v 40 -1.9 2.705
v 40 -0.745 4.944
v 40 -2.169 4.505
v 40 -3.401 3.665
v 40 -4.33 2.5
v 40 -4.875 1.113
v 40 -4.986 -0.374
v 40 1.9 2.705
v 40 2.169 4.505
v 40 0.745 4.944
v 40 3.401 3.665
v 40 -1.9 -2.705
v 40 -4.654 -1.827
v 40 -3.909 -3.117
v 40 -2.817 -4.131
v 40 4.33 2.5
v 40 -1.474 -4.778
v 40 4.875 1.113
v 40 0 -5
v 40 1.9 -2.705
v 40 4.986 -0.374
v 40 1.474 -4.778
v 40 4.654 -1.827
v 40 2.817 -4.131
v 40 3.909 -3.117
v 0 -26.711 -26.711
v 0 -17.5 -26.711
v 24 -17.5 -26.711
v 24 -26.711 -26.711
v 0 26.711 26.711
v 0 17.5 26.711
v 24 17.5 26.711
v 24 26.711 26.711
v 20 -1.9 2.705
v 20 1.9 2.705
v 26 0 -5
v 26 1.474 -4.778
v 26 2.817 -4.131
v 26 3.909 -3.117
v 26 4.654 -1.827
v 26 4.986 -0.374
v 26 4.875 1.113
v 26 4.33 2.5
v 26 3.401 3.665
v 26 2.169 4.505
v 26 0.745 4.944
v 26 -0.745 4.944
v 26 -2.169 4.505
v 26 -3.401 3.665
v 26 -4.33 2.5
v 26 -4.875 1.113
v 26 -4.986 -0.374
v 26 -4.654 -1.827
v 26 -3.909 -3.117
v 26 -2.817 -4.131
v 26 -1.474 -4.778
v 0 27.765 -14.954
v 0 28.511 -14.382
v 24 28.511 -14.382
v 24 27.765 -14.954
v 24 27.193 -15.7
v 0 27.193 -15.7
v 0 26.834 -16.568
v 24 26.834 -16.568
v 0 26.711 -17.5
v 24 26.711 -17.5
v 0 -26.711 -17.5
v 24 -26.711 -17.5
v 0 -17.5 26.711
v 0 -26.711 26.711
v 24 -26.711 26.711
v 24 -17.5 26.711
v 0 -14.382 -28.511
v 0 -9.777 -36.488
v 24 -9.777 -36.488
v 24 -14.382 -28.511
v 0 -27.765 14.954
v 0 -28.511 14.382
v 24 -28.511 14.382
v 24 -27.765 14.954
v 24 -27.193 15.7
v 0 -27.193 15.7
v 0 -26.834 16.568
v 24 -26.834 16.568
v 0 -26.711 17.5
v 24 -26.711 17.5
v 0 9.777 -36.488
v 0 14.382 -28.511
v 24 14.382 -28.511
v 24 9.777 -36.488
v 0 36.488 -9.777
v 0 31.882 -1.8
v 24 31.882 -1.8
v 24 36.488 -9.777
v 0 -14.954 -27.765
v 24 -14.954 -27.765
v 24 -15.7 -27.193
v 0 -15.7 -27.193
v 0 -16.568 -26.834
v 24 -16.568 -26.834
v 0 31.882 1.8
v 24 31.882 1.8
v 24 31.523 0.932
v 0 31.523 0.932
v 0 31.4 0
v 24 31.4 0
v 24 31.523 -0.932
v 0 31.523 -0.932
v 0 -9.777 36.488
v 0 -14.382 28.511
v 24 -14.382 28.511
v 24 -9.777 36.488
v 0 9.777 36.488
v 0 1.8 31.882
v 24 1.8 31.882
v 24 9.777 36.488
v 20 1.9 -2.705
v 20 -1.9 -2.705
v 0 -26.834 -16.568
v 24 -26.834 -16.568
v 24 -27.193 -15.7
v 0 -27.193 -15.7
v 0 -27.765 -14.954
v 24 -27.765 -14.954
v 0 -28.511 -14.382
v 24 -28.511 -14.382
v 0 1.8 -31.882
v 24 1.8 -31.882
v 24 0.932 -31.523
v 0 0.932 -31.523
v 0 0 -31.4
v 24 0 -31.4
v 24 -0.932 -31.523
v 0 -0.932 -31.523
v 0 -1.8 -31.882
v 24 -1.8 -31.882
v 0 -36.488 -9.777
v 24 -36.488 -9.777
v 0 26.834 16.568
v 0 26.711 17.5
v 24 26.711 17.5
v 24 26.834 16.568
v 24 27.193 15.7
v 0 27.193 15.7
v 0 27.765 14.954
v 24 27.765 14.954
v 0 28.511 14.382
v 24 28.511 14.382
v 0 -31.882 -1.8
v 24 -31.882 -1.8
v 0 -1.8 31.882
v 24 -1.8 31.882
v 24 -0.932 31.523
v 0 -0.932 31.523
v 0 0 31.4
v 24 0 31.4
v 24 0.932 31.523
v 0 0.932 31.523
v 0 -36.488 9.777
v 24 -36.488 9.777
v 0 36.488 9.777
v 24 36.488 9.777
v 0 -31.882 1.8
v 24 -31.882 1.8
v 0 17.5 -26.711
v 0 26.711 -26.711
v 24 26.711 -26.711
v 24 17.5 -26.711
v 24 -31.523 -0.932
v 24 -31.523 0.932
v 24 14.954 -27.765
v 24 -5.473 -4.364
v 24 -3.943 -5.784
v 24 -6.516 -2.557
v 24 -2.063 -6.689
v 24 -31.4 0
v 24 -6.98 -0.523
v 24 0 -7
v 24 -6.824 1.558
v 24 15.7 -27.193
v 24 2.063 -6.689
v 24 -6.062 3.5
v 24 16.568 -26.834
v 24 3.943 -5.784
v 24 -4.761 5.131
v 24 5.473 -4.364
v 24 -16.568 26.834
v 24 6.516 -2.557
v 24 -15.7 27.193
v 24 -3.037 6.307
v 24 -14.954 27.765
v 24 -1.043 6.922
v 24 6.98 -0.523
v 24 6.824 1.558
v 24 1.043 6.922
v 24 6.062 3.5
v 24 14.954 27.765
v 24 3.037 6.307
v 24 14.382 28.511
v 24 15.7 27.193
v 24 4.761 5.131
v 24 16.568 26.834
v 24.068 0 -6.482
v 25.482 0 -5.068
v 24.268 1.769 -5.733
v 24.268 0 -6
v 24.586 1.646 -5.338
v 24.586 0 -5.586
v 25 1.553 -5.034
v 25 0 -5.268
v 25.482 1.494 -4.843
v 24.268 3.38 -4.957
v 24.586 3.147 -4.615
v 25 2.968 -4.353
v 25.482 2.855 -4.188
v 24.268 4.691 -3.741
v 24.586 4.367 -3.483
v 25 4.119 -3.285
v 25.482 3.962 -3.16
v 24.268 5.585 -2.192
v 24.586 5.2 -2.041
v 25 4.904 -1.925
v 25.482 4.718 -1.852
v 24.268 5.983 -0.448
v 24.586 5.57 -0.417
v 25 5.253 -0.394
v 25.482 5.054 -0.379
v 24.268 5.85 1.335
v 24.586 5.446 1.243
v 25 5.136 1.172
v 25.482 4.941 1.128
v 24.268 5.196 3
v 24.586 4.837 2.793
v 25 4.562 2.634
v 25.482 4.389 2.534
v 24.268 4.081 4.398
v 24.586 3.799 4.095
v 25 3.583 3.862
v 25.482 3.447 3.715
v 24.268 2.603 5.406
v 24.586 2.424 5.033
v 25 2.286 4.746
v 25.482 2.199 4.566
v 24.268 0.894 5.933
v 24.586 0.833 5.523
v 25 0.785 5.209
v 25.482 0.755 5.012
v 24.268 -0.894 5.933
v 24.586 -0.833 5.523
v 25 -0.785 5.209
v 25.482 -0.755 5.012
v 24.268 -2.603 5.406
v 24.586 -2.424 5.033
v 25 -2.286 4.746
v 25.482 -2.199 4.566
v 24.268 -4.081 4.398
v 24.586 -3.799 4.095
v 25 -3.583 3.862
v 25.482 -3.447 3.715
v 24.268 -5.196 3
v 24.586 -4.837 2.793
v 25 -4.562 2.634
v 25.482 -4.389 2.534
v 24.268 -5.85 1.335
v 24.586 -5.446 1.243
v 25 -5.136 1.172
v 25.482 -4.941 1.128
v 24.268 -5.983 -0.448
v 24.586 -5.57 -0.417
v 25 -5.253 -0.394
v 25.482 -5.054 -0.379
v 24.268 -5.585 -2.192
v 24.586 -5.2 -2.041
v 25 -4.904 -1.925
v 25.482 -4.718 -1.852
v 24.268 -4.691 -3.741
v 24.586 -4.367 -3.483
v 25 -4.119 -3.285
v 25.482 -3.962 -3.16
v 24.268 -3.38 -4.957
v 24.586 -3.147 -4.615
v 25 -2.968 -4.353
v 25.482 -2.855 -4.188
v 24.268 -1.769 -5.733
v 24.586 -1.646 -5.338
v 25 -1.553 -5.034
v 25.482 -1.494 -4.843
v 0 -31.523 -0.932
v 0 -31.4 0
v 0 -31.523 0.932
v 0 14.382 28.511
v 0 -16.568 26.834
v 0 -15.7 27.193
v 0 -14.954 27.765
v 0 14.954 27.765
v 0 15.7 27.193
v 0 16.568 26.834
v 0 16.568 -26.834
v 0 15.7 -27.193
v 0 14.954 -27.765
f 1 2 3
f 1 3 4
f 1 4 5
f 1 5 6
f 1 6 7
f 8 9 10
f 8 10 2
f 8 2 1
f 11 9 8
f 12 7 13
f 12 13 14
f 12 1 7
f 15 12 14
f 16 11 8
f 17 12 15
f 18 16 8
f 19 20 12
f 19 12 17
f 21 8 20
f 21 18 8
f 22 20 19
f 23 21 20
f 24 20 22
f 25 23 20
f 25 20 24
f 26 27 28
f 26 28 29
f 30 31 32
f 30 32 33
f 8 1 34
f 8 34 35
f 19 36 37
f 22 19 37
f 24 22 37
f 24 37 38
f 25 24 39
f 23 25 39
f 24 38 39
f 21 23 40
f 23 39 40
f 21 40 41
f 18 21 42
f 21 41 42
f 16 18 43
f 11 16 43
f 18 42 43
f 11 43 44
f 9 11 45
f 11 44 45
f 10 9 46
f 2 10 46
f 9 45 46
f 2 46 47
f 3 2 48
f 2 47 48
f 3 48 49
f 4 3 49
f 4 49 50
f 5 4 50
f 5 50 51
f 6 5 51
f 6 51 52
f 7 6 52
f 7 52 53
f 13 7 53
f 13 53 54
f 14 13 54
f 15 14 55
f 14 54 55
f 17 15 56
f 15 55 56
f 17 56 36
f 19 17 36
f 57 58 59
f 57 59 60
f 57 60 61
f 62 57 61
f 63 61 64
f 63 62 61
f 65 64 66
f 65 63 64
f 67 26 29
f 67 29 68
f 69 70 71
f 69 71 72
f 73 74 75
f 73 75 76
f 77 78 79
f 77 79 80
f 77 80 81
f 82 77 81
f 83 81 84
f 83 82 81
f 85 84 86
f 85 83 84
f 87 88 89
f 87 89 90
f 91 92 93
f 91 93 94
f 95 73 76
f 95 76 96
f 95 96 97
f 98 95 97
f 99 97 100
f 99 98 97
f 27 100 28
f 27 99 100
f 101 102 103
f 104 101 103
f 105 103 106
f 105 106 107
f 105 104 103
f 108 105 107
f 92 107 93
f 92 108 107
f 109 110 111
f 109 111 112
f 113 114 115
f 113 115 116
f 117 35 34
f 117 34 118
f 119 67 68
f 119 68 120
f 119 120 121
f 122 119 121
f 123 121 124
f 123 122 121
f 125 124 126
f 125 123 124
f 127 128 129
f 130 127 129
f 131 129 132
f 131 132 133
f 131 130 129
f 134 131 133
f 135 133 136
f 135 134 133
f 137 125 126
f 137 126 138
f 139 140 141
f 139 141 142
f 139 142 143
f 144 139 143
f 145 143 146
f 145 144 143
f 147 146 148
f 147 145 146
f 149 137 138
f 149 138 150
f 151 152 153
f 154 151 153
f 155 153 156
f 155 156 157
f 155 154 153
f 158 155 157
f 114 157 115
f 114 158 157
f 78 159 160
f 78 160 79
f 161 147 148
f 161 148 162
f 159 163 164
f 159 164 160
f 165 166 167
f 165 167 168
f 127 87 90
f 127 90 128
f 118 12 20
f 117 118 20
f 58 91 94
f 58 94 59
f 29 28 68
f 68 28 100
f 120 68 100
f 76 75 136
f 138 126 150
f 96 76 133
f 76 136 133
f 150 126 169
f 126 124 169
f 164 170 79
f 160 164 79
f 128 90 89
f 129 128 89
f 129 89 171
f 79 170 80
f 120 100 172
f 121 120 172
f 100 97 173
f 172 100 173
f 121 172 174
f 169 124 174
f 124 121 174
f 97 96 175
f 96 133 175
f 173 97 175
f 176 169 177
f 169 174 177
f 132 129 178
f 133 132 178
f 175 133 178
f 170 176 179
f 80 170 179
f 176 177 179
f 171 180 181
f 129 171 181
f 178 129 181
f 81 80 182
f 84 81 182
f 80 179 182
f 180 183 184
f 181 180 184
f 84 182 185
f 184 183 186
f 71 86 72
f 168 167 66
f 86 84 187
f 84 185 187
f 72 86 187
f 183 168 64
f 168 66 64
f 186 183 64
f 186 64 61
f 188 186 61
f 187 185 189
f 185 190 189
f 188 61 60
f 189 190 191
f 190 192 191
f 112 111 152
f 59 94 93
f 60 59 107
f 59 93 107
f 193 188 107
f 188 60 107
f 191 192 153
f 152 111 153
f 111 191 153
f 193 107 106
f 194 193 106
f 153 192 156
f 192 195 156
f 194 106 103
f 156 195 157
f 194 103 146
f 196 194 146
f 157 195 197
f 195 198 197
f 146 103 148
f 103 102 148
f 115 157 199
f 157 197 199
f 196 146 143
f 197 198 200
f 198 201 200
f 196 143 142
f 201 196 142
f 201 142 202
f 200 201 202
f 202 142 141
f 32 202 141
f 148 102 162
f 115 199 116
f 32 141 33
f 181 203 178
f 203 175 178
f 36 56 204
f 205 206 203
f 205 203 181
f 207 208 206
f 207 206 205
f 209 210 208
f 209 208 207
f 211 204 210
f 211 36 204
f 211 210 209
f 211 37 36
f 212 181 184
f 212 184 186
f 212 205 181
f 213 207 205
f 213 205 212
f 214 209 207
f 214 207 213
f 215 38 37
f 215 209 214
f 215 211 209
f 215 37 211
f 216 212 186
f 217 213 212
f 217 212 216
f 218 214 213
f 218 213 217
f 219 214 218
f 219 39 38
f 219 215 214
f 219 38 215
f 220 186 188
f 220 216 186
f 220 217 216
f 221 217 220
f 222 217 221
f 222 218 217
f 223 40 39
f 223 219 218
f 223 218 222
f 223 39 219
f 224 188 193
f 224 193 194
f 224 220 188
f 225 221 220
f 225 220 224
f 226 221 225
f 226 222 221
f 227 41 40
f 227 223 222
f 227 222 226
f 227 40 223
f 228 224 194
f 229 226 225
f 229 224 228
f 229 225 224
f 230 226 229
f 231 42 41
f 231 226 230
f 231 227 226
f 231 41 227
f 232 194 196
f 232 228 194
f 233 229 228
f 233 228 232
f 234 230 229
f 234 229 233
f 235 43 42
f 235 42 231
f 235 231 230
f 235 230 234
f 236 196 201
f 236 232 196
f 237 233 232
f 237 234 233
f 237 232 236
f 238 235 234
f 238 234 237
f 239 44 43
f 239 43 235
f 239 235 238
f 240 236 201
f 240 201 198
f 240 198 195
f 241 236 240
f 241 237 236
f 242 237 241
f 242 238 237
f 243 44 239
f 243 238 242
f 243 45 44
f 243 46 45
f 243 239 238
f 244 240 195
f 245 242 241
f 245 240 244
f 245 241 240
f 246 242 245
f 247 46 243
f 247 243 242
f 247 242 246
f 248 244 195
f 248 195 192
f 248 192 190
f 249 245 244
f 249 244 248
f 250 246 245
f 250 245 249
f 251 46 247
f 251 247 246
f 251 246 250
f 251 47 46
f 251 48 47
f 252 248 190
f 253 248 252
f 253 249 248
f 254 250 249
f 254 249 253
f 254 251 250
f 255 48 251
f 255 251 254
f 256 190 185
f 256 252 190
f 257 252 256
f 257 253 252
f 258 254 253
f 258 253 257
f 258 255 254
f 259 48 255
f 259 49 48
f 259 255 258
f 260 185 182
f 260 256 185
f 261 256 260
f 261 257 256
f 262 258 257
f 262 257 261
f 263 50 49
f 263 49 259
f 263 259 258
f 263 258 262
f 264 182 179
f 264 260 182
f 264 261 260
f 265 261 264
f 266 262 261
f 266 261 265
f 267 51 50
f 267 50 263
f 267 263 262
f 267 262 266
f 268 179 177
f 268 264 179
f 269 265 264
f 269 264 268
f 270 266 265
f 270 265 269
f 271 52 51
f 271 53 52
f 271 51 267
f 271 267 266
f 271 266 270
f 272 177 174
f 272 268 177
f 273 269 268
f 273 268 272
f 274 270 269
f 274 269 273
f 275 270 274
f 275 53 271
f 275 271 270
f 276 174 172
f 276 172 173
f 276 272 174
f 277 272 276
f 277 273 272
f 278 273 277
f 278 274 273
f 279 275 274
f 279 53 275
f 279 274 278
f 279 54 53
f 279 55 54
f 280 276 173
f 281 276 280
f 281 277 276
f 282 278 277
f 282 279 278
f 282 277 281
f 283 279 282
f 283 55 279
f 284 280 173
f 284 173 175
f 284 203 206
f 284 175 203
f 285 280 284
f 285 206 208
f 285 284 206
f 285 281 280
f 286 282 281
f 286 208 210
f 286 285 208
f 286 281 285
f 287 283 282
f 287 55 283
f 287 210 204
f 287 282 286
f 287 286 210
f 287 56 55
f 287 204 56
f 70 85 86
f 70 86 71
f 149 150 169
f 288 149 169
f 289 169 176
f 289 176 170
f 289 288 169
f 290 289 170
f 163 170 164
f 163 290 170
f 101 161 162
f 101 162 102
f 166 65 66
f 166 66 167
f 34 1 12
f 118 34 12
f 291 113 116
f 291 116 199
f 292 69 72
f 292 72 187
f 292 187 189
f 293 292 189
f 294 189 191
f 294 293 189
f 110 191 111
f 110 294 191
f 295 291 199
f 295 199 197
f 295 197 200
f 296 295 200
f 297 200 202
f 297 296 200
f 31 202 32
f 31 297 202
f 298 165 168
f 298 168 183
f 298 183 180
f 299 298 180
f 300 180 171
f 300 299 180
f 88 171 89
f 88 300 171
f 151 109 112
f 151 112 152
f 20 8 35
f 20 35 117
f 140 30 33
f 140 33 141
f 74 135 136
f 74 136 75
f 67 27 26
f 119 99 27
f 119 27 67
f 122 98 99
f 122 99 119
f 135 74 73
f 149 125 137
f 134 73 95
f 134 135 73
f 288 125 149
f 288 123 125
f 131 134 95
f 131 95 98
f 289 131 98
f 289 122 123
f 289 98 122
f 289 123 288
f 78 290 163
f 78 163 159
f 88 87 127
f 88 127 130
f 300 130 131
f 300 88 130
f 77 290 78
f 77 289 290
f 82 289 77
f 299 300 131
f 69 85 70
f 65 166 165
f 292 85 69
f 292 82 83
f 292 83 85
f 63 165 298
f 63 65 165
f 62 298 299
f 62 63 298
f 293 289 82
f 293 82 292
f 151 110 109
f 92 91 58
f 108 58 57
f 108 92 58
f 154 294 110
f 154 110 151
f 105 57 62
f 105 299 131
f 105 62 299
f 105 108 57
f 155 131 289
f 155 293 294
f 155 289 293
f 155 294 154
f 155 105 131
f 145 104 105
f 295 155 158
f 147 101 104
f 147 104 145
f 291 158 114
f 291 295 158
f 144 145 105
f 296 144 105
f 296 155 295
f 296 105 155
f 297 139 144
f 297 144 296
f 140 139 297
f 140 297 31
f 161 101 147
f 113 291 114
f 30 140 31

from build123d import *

# Parameters (mm, degrees)
BOSS_EXTRUDE1_DEPTH = 24
SKETCH2_R           = 5
BOSS_EXTRUDE2_DEPTH = 16
FILLET1_R           = 2
SKETCH4_W           = 5.41
SKETCH4_H           = 3.8
CUT_EXTRUDE1_DEPTH  = 20


with BuildPart() as part:
    # Sketch1 → Boss-Extrude1 (new body)
    with BuildSketch(Plane(origin=(0, 0, 0), x_dir=(0, 0, -1), z_dir=(1, 0, 0))):
        with BuildLine():
            Line((1.8, 31.882308546), (9.77686398, 36.487753113))
            Line((9.77686398, 36.487753113), (14.382308546, 28.510889132))
            ThreePointArc((14.382308546, 28.510889132), (15.7, 27.193197679), (17.5, 26.710889132))
            Line((17.5, 26.710889132), (26.710889132, 26.710889132))
            Line((26.710889132, 26.710889132), (26.710889132, 17.5))
            ThreePointArc((26.710889132, 17.5), (27.193197679, 15.7), (28.510889132, 14.382308546))
            Line((28.510889132, 14.382308546), (36.487753113, 9.77686398))
            Line((36.487753113, 9.77686398), (31.882308546, 1.8))
            ThreePointArc((31.882308546, 1.8), (31.4, 0), (31.882308546, -1.8))
            Line((31.882308546, -1.8), (36.487753113, -9.77686398))
            Line((36.487753113, -9.77686398), (28.510889132, -14.382308546))
            ThreePointArc((28.510889132, -14.382308546), (27.193197679, -15.7), (26.710889132, -17.5))
            Line((26.710889132, -17.5), (26.710889132, -26.710889132))
            Line((26.710889132, -26.710889132), (17.5, -26.710889132))
            ThreePointArc((17.5, -26.710889132), (15.7, -27.193197679), (14.382308546, -28.510889132))
            Line((14.382308546, -28.510889132), (9.77686398, -36.487753113))
            Line((9.77686398, -36.487753113), (1.8, -31.882308546))
            ThreePointArc((1.8, -31.882308546), (0, -31.4), (-1.8, -31.882308546))
            Line((-1.8, -31.882308546), (-9.77686398, -36.487753113))
            Line((-9.77686398, -36.487753113), (-14.382308546, -28.510889132))
            ThreePointArc((-14.382308546, -28.510889132), (-15.7, -27.193197679), (-17.5, -26.710889132))
            Line((-17.5, -26.710889132), (-26.710889132, -26.710889132))
            Line((-26.710889132, -26.710889132), (-26.710889132, -17.5))
            ThreePointArc((-26.710889132, -17.5), (-27.193197679, -15.7), (-28.510889132, -14.382308546))
            Line((-28.510889132, -14.382308546), (-36.487753113, -9.77686398))
            Line((-36.487753113, -9.77686398), (-31.882308546, -1.8))
            ThreePointArc((-31.882308546, -1.8), (-31.4, 0), (-31.882308546, 1.8))
            Line((-31.882308546, 1.8), (-36.487753113, 9.77686398))
            Line((-36.487753113, 9.77686398), (-28.510889132, 14.382308546))
            ThreePointArc((-28.510889132, 14.382308546), (-27.193197679, 15.7), (-26.710889132, 17.5))
            Line((-26.710889132, 17.5), (-26.710889132, 26.710889132))
            Line((-26.710889132, 26.710889132), (-17.5, 26.710889132))
            ThreePointArc((-17.5, 26.710889132), (-15.7, 27.193197679), (-14.382308546, 28.510889132))
            Line((-14.382308546, 28.510889132), (-9.77686398, 36.487753113))
            Line((-9.77686398, 36.487753113), (-1.8, 31.882308546))
            ThreePointArc((-1.8, 31.882308546), (0, 31.4), (1.8, 31.882308546))
        make_face()
    extrude(amount=BOSS_EXTRUDE1_DEPTH)

    # Sketch2 → Boss-Extrude2 (add)
    with BuildSketch(Plane(origin=(24, 0, 0), x_dir=(0, 0, -1), z_dir=(1, 0, 0))):
        Circle(SKETCH2_R)
    extrude(amount=BOSS_EXTRUDE2_DEPTH)

    # Fillet1
    fillet1_edges = [part.edges().sort_by_distance(p)[0] for p in [
        (24, 0, 5),
    ]]
    fillet(fillet1_edges, radius=FILLET1_R)

    # Sketch4 → Cut-Extrude1 (cut)
    with BuildSketch(Plane(origin=(40, 0, 0), x_dir=(0, 0, -1), z_dir=(1, 0, 0))):
        Rectangle(SKETCH4_W, SKETCH4_H)
    extrude(amount=-CUT_EXTRUDE1_DEPTH, mode=Mode.SUBTRACT)


solid = part.part
